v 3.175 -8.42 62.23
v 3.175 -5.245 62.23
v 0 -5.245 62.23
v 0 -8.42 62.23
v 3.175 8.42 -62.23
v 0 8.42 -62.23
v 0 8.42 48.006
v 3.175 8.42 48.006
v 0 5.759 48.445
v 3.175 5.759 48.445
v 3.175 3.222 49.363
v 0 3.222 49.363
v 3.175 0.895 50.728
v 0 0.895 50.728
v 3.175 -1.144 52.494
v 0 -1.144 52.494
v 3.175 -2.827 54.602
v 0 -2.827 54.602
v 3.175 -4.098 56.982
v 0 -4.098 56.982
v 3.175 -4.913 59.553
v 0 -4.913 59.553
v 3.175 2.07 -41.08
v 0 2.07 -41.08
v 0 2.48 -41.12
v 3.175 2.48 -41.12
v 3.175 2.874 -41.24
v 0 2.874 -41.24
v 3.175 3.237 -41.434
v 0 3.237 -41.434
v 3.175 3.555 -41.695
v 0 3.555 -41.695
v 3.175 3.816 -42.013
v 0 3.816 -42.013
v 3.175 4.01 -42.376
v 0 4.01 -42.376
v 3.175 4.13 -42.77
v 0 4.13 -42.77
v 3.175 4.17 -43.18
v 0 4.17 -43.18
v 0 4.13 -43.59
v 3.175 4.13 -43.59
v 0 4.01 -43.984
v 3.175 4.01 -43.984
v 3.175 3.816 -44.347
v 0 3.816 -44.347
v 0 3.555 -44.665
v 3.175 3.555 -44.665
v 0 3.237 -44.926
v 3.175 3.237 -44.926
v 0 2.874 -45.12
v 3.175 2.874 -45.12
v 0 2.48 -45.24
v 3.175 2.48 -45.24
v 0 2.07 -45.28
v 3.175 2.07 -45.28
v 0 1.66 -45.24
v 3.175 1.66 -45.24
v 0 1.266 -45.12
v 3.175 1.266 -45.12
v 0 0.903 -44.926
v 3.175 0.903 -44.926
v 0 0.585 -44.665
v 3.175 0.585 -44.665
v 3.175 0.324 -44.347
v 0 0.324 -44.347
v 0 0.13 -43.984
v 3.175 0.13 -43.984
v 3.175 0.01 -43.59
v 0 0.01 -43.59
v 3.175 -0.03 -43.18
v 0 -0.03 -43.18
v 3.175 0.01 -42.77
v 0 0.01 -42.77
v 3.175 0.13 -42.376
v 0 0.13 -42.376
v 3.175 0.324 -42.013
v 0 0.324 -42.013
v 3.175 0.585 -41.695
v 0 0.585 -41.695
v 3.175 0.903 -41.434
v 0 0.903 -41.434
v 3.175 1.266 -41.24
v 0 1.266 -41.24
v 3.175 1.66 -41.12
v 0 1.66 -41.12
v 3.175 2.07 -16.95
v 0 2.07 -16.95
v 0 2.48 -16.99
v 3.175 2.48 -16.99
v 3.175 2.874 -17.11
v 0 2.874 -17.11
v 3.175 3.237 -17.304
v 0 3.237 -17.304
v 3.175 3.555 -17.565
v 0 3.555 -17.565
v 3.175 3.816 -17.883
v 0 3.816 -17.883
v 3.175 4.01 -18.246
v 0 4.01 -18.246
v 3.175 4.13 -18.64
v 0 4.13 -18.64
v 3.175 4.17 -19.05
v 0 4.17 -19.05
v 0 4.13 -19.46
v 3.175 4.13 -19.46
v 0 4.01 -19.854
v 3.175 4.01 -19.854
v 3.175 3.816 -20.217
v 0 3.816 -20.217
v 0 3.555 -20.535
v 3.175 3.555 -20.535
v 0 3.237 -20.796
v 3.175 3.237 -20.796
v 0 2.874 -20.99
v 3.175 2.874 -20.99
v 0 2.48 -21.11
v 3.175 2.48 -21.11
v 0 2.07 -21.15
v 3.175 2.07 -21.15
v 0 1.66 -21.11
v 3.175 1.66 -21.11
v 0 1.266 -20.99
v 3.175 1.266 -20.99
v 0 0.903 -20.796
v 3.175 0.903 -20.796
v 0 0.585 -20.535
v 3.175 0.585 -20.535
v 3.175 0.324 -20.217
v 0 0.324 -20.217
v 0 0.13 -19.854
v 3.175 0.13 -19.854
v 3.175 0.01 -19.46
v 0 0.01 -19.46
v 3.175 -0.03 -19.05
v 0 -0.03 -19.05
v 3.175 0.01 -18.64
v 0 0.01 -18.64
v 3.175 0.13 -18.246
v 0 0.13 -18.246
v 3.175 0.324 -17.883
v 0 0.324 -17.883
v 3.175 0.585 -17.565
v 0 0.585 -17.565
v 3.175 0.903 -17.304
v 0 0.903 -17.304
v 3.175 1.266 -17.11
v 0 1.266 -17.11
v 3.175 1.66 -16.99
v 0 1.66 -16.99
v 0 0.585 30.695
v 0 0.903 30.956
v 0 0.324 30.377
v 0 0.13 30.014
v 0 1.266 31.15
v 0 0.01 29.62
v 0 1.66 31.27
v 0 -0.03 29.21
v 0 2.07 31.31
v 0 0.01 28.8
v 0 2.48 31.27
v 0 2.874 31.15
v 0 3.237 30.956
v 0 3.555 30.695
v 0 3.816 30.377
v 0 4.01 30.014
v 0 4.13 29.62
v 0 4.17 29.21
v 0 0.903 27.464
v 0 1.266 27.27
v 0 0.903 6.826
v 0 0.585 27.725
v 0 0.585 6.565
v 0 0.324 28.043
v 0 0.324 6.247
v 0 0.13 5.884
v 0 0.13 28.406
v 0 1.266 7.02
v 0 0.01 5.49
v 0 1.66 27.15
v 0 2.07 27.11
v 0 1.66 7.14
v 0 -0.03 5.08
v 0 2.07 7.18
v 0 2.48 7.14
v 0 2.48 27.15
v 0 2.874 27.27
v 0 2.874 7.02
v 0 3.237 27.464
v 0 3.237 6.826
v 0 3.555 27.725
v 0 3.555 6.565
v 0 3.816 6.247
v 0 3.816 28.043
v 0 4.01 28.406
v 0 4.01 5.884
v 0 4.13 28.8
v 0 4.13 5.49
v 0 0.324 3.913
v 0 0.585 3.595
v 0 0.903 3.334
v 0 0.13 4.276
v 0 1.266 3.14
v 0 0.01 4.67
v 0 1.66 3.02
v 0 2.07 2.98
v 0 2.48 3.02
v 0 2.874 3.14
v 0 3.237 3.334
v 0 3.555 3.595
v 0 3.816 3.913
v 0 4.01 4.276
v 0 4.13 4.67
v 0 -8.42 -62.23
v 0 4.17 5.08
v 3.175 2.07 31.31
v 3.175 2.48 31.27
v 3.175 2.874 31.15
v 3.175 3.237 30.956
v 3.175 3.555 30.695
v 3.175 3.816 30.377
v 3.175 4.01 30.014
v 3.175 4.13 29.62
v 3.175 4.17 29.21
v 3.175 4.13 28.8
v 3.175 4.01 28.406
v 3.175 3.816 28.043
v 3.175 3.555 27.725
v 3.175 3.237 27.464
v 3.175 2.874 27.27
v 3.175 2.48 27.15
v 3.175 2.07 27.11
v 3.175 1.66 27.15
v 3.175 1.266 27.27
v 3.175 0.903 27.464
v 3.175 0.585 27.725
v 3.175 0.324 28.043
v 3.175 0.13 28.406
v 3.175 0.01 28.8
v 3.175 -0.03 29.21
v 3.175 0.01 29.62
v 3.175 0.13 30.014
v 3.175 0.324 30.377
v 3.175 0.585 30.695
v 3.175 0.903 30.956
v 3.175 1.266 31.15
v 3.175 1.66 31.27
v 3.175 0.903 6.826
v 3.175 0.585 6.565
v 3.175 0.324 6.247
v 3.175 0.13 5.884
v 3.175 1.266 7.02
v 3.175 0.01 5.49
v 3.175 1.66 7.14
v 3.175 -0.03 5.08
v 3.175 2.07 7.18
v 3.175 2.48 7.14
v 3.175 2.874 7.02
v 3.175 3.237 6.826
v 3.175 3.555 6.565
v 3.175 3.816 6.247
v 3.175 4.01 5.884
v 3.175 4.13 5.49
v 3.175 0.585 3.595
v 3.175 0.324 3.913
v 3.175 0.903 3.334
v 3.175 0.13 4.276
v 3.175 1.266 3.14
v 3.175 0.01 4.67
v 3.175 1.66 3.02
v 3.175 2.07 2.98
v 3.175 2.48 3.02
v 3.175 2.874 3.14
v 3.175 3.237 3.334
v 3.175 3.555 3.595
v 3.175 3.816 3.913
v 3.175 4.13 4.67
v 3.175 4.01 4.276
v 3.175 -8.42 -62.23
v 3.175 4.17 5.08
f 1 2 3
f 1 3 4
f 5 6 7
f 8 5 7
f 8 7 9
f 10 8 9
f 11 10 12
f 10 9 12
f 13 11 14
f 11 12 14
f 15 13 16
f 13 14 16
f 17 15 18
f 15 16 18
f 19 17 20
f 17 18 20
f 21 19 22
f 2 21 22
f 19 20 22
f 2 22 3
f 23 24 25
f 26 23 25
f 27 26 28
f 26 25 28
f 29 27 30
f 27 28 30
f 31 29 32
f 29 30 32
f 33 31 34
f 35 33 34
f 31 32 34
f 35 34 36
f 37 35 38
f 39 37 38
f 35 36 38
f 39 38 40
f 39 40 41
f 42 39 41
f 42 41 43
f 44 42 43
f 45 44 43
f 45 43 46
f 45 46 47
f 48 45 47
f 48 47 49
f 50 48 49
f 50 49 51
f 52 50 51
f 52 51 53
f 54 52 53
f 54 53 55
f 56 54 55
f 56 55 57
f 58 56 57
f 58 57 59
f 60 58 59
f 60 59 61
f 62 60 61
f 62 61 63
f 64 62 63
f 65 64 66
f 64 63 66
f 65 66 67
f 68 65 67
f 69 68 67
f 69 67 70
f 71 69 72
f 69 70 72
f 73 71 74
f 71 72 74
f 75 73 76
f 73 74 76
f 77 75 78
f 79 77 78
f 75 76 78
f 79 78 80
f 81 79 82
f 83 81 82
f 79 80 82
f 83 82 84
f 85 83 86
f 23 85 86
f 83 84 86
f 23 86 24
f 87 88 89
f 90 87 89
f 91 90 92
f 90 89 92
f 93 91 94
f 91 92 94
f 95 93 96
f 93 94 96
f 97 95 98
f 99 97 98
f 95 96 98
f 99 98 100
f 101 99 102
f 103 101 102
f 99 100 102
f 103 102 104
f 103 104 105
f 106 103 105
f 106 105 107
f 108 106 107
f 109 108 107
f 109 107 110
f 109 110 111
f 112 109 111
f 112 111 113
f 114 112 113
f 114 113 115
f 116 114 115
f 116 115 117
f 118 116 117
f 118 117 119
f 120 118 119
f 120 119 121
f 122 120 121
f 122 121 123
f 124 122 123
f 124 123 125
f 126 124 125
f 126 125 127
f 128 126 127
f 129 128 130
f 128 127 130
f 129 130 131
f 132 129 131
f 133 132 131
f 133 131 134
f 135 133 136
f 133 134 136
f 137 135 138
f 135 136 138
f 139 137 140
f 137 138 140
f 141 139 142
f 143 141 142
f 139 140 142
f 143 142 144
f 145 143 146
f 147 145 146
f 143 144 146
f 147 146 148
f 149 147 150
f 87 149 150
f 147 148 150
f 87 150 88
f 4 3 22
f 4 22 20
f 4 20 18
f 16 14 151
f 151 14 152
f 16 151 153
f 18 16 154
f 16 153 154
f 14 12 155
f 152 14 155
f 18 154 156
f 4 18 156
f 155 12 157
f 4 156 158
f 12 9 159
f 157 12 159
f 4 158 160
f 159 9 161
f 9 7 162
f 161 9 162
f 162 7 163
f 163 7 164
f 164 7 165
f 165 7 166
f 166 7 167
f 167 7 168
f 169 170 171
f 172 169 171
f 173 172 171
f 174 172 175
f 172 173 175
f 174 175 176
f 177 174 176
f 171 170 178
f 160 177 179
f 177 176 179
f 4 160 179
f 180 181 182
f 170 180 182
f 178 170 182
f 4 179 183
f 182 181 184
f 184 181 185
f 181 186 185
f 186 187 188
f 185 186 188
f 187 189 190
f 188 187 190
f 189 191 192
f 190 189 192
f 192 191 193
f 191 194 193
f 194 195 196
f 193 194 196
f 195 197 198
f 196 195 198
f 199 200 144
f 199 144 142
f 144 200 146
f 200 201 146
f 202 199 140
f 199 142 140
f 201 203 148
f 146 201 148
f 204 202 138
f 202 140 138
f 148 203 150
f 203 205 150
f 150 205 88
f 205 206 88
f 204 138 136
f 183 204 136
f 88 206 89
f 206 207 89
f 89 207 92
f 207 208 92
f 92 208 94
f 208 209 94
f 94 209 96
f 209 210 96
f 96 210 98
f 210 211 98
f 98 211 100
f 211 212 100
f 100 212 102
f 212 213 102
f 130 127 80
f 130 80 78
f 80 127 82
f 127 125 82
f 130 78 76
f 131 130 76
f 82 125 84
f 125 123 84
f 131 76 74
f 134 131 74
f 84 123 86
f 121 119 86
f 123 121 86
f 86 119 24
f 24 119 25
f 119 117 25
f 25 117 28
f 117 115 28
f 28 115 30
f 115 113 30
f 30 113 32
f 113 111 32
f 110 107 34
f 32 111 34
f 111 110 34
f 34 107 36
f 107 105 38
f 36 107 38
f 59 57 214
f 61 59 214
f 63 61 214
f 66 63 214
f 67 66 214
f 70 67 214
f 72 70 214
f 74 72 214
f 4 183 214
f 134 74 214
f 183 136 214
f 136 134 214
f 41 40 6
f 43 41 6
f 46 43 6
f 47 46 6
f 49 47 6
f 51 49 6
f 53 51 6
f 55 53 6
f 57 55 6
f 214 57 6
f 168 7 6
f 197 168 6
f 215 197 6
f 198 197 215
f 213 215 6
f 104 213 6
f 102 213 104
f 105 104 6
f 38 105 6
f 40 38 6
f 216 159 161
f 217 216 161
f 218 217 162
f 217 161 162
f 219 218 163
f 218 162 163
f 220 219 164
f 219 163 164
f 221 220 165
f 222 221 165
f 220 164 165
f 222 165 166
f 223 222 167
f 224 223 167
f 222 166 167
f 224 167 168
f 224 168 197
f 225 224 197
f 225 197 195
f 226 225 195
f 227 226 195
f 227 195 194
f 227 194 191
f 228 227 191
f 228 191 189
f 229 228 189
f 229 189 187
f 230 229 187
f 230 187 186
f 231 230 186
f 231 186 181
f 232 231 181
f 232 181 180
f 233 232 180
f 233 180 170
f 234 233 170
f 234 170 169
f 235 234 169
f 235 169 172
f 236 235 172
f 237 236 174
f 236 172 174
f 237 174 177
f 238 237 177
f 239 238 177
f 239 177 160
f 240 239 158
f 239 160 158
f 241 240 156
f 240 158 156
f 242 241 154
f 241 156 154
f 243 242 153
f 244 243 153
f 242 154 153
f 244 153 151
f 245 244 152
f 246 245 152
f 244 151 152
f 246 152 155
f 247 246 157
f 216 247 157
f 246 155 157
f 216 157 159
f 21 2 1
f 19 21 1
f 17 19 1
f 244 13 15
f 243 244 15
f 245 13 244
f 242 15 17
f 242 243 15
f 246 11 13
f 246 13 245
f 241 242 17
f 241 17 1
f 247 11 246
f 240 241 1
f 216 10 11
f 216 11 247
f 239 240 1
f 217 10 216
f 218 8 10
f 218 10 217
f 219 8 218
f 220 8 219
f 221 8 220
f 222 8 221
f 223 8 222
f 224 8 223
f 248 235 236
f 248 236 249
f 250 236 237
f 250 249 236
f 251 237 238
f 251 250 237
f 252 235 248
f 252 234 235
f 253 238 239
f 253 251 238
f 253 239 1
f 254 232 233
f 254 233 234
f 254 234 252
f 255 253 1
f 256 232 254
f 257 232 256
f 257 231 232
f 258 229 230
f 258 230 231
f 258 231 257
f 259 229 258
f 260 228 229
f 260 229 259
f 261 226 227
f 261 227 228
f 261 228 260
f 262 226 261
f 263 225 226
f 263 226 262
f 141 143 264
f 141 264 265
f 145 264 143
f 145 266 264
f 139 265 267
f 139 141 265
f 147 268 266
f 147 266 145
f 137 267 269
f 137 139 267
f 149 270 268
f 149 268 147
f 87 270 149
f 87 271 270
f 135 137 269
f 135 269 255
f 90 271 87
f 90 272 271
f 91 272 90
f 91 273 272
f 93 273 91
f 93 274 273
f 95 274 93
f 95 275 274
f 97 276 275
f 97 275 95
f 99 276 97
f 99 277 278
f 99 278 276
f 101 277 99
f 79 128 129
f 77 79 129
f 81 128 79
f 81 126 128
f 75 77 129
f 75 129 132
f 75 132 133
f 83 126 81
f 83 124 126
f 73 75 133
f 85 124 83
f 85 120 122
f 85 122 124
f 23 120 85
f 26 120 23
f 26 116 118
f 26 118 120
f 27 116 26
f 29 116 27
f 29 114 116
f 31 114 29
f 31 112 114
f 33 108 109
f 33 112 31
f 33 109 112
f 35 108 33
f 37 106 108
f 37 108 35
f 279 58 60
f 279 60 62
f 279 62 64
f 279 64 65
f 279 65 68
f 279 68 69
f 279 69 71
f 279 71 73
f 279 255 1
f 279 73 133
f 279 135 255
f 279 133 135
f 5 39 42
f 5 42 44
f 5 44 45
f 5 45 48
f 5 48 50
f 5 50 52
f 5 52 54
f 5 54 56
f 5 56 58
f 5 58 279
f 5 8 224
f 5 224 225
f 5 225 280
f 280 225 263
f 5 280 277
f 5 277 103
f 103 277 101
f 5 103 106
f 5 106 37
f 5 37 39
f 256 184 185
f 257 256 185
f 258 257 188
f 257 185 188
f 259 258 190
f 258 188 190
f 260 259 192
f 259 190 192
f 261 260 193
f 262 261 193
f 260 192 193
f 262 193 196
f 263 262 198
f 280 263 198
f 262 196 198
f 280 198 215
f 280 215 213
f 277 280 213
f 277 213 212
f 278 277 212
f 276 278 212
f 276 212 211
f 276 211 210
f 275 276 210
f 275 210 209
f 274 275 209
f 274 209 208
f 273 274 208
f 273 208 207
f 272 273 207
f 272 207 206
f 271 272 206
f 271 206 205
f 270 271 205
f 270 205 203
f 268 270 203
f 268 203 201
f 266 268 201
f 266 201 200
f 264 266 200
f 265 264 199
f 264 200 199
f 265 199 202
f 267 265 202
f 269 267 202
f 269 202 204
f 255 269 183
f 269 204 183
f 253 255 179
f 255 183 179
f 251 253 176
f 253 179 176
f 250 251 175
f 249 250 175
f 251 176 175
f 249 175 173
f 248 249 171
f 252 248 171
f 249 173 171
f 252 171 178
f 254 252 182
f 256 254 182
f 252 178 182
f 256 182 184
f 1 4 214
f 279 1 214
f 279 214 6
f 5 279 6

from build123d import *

# Parameters (mm, degrees)
BOSS_EXTRUDE1_DEPTH = 3.175
SKETCH3_R           = 2.1
CUT_EXTRUDE1_DEPTH  = 4.175


with BuildPart() as part:
    # Sketch1 → Boss-Extrude1 (new body)
    with BuildSketch(Plane(origin=(0, 0, 0), x_dir=(0, 0, -1), z_dir=(1, 0, 0))):
        with BuildLine():
            Line((-62.23, -8.4201), (62.23, -8.4201))
            Line((62.23, -8.4201), (62.23, 8.4201))
            Line((62.23, 8.4201), (-48.006, 8.4201))
            ThreePointArc((-48.006, 8.4201), (-52.493538794, -1.144281181), (-62.23, -5.2451))
            Line((-62.23, -5.2451), (-62.23, -8.4201))
        make_face()
    extrude(amount=BOSS_EXTRUDE1_DEPTH)

    # Sketch3 → Cut-Extrude1 (cut, through all)
    with BuildSketch(Plane.ZY):
        with Locations((-43.18, 2.0701)):
            Circle(SKETCH3_R)
        with Locations((-19.05, 2.0701)):
            Circle(SKETCH3_R)
        with Locations((5.08, 2.0701)):
            Circle(SKETCH3_R)
        with Locations((29.21, 2.0701)):
            Circle(SKETCH3_R)
    extrude(amount=-CUT_EXTRUDE1_DEPTH, mode=Mode.SUBTRACT)


solid = part.part
